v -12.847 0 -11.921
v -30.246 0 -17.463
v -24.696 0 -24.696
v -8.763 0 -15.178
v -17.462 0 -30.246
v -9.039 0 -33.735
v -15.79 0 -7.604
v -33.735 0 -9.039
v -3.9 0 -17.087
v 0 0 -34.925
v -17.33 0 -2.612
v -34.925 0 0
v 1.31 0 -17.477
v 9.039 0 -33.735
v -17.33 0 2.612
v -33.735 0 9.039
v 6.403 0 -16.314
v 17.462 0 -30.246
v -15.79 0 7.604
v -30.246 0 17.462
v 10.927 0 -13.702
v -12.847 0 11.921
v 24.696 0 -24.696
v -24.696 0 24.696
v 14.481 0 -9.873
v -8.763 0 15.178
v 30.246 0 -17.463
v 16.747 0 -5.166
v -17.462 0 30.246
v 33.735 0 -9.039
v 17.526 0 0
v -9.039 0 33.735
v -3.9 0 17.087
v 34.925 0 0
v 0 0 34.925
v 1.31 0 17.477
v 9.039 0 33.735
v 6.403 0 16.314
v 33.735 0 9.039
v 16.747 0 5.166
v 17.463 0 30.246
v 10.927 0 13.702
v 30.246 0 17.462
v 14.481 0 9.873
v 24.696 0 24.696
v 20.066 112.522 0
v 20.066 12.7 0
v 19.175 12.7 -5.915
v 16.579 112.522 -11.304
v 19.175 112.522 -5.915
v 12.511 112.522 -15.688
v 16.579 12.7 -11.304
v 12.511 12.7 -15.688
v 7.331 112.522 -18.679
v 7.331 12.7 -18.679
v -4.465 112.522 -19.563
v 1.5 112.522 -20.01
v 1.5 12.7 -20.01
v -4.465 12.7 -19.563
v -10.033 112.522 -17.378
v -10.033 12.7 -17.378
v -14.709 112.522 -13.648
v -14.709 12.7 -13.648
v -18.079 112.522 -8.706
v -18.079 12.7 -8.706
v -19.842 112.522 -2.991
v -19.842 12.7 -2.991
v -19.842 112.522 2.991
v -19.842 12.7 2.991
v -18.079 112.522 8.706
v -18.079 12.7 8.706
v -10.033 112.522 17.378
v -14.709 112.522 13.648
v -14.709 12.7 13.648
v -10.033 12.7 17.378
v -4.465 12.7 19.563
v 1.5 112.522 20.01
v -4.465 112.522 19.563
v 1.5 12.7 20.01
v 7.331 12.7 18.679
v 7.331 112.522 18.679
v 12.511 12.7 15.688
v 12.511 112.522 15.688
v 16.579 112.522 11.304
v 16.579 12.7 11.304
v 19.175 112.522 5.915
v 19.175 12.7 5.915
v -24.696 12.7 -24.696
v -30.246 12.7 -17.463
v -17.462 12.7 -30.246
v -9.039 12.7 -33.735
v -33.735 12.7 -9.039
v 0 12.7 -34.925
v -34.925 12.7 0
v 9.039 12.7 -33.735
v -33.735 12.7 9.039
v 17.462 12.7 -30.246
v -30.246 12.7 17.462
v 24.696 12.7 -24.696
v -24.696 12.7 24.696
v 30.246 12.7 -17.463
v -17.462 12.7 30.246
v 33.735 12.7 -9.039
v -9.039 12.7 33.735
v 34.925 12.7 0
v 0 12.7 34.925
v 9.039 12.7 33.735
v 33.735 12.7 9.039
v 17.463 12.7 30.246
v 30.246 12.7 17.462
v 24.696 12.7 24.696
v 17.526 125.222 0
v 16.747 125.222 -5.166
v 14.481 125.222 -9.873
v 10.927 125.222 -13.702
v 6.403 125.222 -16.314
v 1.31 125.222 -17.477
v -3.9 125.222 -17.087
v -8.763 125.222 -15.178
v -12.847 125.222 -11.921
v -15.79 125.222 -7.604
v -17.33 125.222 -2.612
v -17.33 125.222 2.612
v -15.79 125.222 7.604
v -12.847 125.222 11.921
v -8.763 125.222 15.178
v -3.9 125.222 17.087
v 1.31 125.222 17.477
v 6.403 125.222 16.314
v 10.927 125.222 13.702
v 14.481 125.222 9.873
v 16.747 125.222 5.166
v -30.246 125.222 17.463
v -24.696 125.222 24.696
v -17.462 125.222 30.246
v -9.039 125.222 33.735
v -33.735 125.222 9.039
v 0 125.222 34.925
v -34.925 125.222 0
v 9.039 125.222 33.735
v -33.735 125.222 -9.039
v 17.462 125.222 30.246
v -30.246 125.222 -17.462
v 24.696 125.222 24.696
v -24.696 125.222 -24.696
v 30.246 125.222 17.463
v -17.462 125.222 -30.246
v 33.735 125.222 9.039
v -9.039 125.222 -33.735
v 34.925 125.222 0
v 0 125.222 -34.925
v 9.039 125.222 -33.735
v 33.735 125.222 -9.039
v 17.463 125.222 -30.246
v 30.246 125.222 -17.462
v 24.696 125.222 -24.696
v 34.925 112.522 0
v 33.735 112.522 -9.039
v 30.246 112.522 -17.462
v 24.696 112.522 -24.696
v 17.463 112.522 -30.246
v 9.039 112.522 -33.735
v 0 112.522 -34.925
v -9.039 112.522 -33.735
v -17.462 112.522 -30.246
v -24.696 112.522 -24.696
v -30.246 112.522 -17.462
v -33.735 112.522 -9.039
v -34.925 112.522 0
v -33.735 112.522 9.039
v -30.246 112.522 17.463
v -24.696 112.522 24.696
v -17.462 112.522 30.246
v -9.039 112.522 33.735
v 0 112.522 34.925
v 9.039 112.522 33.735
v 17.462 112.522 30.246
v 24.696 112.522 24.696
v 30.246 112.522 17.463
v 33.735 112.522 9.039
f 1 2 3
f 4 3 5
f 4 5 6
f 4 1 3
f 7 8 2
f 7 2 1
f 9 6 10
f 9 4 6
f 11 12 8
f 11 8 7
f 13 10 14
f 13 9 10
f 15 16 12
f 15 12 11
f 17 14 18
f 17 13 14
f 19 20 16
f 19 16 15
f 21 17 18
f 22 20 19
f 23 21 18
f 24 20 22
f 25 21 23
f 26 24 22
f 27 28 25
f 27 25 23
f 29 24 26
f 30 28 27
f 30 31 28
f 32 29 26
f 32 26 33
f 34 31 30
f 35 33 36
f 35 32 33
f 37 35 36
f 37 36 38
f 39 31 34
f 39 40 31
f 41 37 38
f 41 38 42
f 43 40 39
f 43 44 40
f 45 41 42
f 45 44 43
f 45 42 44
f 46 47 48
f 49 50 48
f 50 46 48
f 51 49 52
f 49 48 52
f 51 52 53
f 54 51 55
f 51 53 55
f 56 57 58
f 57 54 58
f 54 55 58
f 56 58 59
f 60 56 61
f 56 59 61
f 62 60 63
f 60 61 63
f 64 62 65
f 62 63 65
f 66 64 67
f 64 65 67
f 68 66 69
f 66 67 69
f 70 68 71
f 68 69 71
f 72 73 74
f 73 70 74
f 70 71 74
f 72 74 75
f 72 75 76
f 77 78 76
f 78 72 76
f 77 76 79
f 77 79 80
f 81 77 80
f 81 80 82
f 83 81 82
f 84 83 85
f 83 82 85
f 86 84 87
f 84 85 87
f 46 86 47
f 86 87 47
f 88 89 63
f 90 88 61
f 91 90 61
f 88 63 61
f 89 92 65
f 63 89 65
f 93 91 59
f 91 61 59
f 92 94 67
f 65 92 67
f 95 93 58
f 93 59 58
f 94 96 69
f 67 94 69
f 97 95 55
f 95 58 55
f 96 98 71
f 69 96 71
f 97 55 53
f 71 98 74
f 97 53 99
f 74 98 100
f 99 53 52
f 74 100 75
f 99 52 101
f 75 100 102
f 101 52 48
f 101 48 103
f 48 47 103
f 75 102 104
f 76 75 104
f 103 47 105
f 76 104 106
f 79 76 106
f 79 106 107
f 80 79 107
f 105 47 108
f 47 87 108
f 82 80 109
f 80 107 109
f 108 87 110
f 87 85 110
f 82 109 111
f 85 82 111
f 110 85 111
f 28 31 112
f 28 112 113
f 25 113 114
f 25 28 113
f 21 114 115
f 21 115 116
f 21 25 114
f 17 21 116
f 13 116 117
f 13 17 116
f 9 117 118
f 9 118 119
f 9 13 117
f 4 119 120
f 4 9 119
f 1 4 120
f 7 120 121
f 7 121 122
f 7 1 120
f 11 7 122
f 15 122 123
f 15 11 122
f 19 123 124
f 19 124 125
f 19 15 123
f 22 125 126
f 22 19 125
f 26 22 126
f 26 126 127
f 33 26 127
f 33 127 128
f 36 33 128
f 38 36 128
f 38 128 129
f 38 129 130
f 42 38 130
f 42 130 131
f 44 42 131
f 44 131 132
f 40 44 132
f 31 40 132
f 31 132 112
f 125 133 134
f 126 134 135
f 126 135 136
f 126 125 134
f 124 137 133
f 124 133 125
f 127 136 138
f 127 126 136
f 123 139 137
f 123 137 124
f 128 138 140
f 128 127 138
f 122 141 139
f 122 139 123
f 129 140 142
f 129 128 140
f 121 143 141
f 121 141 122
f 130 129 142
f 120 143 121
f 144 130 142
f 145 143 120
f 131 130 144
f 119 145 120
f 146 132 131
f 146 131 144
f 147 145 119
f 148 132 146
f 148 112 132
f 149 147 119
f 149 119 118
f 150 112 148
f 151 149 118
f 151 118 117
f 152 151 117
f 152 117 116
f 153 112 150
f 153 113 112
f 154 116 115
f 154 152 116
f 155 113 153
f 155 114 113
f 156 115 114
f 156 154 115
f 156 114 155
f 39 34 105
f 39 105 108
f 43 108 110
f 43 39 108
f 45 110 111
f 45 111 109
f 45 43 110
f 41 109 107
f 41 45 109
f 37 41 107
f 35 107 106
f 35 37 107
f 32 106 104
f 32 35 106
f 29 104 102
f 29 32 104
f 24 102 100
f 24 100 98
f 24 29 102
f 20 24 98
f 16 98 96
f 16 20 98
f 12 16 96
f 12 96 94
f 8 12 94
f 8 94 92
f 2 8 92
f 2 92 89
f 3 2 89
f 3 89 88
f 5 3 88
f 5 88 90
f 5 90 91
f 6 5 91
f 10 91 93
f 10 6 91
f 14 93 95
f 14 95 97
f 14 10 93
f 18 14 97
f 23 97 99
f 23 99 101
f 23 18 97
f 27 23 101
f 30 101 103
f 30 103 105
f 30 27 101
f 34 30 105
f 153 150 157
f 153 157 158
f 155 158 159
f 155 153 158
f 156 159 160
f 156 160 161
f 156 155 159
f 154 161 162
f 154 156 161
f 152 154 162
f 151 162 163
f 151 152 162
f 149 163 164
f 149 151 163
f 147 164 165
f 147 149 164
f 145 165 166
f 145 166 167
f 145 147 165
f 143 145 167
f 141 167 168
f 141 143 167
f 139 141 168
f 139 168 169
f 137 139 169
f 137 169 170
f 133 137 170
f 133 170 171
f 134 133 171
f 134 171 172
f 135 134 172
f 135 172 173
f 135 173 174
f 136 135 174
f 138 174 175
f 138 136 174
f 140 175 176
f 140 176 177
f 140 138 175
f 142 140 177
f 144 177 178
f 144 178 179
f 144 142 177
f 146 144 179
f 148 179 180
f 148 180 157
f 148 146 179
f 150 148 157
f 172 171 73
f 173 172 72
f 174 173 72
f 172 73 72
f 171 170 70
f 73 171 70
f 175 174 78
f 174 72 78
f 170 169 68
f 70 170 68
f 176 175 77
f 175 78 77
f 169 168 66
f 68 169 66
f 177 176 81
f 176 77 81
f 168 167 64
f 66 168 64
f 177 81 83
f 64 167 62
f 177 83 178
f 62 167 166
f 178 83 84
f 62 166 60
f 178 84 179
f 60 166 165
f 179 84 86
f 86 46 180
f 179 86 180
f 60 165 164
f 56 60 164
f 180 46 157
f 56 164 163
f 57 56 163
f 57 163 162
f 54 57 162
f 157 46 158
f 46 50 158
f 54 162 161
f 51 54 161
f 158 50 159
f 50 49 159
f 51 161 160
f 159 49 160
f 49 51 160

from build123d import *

# Parameters (mm, degrees)
SKETCH1_R      = 20.066
SKETCH1_R_2    = 17.526
EXTRUDE1_DEPTH = 125.222
SKETCH2_R      = 34.925
SKETCH2_R_2    = 17.526
EXTRUDE2_DEPTH = 12.7
SKETCH3_R      = 34.925
SKETCH3_R_2    = 17.526
EXTRUDE3_DEPTH = 12.7


with BuildPart() as part:
    # Sketch1 → Extrude1 (new body)
    with BuildSketch(Plane(origin=(0, 0, 0), x_dir=(1, 0, 0), z_dir=(0, 1, 0))):
        Circle(SKETCH1_R)
        Circle(SKETCH1_R_2, mode=Mode.SUBTRACT)
    extrude(amount=EXTRUDE1_DEPTH)

    # Sketch2 → Extrude2 (add)
    with BuildSketch(Plane(origin=(0, 125.222, 0), x_dir=(1, 0, 0), z_dir=(0, 1, 0))):
        Circle(SKETCH2_R)
        Circle(SKETCH2_R_2, mode=Mode.SUBTRACT)
    extrude(amount=-EXTRUDE2_DEPTH)

    # Sketch3 → Extrude3 (add)
    with BuildSketch(Plane.XZ):
        Circle(SKETCH3_R)
        Circle(SKETCH3_R_2, mode=Mode.SUBTRACT)
    extrude(amount=-EXTRUDE3_DEPTH)


solid = part.part
